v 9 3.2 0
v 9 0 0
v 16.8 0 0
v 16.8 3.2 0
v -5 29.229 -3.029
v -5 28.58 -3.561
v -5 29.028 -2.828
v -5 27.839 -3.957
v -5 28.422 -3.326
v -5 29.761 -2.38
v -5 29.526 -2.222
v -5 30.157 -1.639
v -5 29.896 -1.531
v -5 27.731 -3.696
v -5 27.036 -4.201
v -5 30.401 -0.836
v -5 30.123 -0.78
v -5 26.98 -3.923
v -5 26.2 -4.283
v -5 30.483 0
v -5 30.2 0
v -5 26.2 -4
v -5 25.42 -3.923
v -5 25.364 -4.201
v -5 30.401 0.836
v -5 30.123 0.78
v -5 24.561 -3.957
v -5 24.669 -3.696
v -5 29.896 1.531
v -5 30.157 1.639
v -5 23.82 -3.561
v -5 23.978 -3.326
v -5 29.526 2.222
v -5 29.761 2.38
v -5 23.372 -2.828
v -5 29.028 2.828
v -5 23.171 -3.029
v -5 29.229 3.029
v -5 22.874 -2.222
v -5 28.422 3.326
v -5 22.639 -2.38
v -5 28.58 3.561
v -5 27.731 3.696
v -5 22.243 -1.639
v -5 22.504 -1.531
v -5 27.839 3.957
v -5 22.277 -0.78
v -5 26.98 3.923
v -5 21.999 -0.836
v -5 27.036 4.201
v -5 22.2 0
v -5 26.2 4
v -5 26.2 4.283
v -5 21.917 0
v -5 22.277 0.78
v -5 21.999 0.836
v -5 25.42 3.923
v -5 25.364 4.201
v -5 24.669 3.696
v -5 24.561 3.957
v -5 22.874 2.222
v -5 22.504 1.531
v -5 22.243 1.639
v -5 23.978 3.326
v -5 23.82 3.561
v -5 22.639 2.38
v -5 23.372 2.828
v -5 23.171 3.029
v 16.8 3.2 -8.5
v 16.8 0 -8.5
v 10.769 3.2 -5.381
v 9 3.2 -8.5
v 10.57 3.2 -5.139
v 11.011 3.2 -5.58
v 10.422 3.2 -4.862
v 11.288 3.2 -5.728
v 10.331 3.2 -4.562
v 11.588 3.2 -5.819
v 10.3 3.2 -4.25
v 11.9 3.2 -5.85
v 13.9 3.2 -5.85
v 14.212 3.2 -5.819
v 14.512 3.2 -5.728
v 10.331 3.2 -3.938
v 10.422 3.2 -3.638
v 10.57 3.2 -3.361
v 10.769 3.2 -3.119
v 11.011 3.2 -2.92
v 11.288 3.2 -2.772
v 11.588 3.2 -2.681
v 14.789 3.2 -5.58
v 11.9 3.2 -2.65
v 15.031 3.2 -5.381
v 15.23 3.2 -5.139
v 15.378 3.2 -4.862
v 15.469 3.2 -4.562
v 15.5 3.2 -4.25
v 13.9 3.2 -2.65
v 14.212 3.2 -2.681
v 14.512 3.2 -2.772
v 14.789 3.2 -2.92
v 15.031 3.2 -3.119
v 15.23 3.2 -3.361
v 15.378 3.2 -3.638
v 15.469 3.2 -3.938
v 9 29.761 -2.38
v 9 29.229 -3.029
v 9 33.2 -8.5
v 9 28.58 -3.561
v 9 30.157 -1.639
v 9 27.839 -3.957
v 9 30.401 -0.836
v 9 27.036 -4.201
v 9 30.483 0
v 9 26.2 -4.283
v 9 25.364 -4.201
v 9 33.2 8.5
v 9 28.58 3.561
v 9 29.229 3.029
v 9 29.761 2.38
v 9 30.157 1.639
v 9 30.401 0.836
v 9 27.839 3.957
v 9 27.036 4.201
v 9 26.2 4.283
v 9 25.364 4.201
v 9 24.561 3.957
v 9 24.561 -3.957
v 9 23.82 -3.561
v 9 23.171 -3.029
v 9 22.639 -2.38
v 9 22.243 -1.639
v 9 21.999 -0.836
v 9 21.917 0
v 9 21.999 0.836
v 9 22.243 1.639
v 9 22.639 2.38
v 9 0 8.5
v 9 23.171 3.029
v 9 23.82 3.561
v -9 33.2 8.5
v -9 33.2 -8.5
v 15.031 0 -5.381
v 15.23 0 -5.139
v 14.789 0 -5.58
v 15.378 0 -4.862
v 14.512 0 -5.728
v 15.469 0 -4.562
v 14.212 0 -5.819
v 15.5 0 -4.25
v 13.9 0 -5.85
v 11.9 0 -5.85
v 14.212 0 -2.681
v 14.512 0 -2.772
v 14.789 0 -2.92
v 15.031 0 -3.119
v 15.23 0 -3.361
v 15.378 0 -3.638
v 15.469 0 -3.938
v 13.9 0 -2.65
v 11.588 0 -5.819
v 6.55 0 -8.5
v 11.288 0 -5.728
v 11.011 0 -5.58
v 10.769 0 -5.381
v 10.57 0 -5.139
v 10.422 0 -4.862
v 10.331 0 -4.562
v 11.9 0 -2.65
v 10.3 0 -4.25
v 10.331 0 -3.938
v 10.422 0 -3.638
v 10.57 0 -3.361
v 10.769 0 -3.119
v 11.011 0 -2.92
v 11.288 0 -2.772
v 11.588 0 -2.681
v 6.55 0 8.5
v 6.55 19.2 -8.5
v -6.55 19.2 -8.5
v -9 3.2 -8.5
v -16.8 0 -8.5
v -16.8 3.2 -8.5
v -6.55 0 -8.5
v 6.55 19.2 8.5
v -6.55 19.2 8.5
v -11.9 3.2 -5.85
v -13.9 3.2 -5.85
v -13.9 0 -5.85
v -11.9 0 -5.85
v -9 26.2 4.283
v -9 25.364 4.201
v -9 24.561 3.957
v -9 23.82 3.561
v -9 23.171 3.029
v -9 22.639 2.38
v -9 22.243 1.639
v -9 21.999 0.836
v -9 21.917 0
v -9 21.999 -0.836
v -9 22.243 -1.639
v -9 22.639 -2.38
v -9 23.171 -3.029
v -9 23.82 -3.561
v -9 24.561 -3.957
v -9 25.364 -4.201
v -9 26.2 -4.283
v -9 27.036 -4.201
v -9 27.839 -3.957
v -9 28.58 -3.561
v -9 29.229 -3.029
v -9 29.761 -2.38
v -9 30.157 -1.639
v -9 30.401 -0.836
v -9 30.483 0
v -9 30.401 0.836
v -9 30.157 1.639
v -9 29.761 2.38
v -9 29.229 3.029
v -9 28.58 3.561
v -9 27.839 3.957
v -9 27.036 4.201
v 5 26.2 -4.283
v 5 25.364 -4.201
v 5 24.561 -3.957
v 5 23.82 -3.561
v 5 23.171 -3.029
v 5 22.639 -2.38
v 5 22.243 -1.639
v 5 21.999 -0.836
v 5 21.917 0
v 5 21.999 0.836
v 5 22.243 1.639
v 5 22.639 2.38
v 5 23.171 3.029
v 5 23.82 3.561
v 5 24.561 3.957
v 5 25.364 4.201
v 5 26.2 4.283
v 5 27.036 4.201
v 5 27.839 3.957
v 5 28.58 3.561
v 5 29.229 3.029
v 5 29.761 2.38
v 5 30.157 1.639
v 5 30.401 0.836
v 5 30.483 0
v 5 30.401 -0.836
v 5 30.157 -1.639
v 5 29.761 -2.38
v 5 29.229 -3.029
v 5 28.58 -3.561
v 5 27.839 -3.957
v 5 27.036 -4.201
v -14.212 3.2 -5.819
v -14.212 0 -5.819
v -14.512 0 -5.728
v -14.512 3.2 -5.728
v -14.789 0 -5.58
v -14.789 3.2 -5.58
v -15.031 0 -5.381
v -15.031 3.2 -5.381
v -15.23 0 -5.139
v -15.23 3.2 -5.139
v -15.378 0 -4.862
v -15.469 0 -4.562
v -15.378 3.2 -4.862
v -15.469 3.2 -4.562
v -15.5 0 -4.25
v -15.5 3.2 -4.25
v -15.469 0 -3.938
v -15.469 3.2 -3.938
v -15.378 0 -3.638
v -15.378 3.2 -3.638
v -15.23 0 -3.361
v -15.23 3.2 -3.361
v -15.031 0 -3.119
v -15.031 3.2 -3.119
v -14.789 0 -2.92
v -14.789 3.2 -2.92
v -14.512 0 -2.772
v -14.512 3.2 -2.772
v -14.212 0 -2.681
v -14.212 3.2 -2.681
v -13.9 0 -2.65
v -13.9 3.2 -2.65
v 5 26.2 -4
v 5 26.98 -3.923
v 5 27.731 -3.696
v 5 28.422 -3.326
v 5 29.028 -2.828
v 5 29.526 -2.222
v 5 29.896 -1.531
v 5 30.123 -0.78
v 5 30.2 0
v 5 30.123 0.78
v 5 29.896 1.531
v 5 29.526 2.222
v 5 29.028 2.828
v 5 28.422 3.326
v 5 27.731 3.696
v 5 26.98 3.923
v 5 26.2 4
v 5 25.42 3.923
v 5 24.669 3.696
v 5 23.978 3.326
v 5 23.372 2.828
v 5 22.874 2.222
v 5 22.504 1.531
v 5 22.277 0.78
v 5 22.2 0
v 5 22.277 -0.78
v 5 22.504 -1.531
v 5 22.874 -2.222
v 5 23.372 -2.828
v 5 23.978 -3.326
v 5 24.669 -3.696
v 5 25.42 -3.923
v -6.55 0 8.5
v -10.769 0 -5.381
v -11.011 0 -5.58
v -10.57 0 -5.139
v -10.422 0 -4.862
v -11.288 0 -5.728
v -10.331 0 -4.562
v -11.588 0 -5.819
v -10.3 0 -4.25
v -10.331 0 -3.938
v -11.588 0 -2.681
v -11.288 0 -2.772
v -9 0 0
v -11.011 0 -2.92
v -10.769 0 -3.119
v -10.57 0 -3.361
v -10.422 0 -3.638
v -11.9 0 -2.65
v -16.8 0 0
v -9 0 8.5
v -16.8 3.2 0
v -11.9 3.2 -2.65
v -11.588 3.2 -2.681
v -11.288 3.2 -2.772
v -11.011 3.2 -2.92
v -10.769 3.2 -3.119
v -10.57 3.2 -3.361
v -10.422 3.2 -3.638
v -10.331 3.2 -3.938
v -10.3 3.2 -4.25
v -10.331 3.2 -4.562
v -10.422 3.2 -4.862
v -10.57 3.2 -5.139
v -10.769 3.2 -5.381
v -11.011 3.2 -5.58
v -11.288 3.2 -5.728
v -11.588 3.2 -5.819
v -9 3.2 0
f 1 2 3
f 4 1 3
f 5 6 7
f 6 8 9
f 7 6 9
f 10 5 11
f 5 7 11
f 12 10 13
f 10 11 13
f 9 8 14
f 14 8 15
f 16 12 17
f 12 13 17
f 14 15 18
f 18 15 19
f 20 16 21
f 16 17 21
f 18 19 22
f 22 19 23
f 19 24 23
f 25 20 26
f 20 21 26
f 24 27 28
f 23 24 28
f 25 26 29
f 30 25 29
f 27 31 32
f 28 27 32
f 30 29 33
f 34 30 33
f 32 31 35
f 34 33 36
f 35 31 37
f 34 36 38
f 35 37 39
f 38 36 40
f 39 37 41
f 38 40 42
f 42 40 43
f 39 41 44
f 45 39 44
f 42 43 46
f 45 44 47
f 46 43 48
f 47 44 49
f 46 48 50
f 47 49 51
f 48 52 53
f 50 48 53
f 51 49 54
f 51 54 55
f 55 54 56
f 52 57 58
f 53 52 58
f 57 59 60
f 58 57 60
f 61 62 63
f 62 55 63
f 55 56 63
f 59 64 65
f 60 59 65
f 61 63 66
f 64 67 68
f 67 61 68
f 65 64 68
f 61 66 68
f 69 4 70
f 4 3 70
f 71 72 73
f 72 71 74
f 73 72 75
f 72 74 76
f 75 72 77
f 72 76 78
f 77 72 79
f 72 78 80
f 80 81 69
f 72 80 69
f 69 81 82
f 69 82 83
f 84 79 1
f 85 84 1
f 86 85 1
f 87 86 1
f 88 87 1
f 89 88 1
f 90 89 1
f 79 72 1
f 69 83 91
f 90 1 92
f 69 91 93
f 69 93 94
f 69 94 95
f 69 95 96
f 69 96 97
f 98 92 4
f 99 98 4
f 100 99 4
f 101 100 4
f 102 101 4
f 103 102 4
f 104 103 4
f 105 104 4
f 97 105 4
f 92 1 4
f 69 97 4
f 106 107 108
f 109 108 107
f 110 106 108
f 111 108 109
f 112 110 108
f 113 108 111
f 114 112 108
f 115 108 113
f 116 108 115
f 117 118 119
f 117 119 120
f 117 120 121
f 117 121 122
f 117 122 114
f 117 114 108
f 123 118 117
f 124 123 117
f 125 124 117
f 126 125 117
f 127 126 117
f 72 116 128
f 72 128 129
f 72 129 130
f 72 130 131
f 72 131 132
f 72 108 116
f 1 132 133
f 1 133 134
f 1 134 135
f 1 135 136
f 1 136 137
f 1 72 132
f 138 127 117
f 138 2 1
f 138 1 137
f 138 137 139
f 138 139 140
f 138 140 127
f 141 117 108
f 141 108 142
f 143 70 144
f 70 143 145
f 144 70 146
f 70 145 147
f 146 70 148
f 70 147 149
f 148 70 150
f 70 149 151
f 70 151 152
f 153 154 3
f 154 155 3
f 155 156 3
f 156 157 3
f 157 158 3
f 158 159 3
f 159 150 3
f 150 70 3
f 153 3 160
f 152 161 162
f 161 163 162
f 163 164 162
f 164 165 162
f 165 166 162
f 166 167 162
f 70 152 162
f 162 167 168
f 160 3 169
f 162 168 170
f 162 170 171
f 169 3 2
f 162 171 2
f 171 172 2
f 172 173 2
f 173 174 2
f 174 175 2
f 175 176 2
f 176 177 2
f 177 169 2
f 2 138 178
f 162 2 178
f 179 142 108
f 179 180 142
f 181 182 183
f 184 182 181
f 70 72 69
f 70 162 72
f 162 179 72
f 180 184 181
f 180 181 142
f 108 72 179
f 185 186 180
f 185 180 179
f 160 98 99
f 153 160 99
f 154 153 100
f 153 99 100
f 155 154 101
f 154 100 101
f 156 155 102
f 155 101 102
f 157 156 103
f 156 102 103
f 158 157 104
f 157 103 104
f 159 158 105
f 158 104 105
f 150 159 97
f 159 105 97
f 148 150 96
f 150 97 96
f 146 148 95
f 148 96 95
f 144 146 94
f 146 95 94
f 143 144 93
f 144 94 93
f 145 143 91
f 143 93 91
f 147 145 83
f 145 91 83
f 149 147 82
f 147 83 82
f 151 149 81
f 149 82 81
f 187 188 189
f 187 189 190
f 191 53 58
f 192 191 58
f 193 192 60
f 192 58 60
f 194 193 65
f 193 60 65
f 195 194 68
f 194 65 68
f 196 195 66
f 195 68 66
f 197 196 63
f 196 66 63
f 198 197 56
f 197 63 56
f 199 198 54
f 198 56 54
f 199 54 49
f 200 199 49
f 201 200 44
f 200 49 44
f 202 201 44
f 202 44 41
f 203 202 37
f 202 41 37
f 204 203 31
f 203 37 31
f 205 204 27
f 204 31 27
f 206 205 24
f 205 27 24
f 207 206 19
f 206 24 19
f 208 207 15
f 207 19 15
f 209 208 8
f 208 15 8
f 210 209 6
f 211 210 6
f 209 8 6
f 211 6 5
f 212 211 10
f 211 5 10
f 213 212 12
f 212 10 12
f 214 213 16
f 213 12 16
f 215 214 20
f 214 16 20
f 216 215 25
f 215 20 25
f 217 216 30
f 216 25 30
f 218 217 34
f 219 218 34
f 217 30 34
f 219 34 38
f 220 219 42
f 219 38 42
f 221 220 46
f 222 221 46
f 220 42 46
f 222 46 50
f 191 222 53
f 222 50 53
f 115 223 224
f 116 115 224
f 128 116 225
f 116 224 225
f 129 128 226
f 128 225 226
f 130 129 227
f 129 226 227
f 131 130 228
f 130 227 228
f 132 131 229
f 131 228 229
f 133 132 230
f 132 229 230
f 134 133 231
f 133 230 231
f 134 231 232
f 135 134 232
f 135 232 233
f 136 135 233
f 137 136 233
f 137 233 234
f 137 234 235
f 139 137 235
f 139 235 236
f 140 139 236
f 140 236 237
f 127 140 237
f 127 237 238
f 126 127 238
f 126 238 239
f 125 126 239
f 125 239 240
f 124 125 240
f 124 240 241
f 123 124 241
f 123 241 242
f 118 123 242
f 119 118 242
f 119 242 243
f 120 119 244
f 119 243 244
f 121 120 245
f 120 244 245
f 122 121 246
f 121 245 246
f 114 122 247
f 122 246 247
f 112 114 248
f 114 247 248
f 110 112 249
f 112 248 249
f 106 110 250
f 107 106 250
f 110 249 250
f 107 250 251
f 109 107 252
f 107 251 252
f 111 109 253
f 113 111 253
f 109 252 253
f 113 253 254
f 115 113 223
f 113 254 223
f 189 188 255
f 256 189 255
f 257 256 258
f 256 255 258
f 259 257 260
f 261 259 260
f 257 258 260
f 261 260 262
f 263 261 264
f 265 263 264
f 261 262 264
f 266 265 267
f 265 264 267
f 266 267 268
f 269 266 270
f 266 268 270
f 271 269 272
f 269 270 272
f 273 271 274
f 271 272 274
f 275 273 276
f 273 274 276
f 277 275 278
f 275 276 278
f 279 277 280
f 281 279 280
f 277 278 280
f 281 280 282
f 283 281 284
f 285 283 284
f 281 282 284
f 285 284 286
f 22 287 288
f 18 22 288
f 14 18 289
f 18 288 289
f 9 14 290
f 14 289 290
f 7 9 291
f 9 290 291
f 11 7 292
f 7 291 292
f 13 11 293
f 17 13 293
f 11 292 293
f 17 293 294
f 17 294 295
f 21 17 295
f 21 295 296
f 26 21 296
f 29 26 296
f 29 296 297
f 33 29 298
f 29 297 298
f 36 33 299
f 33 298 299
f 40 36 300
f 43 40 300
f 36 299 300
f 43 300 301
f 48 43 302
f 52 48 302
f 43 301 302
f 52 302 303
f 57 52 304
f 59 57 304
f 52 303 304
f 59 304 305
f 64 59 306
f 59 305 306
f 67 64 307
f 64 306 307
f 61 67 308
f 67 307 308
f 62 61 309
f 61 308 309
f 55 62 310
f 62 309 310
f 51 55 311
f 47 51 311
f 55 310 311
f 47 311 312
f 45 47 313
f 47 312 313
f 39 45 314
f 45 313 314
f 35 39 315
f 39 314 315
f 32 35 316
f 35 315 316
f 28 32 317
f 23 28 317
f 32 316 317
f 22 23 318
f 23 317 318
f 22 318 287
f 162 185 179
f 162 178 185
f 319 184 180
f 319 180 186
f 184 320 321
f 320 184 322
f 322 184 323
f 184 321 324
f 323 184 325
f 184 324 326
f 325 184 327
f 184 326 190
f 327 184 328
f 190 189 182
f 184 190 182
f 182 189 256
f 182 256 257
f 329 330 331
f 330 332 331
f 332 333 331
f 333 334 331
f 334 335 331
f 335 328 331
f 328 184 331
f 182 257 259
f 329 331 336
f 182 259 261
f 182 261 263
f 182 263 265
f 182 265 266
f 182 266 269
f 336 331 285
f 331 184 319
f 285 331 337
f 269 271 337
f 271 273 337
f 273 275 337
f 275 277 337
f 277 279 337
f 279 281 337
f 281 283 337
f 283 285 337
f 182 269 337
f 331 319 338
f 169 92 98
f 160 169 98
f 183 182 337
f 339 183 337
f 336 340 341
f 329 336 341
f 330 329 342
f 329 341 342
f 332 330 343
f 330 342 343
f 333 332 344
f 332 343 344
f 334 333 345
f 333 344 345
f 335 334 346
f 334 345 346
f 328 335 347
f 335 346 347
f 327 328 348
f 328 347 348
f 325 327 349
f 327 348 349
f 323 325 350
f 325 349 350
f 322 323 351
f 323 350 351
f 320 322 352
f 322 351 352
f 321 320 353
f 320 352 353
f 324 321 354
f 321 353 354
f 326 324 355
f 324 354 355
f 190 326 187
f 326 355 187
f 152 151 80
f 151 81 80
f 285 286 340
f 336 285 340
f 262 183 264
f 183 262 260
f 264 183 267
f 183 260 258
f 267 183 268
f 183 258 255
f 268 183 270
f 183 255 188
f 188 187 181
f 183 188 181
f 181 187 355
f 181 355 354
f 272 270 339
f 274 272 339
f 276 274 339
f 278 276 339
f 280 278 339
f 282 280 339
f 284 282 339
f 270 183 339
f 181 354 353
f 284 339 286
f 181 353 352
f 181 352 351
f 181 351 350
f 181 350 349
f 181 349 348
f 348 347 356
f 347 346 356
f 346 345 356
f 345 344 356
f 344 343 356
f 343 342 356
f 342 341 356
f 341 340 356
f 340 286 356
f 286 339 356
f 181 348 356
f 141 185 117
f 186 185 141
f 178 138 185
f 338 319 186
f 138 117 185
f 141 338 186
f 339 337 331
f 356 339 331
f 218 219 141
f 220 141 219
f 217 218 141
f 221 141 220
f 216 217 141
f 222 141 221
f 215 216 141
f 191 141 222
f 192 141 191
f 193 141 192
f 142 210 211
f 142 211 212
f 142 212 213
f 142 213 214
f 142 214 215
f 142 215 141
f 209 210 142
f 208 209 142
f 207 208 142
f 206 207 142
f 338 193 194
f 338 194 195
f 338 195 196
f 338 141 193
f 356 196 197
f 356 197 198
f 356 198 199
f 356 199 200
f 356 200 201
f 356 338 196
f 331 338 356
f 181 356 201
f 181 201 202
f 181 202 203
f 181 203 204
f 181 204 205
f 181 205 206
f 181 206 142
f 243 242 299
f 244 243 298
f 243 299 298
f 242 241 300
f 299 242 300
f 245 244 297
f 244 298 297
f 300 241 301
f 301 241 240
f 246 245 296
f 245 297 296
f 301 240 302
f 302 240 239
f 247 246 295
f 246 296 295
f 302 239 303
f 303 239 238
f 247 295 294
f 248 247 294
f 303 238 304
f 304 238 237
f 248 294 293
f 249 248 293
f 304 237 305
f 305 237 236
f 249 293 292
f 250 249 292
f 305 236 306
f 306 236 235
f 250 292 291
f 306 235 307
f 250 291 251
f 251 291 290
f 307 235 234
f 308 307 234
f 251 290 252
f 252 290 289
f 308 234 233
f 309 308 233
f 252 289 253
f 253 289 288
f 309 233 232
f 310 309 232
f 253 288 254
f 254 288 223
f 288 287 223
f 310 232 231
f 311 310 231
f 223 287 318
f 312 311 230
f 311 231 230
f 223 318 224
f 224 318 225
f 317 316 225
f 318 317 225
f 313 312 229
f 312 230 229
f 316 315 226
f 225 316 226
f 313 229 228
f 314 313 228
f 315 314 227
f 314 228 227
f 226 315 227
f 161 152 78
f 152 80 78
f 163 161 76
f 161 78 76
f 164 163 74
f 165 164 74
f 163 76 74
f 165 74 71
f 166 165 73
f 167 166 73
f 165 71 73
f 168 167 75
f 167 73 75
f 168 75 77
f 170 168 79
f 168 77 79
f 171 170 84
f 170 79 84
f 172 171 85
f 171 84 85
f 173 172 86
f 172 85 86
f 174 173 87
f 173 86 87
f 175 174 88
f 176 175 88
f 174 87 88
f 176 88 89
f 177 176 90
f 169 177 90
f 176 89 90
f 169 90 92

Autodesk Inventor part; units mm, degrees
ref_plane "YZ Plane" through (0, 0, 0) normal (1, 0, 0) x (0, 1, 0)
ref_plane "XZ Plane" through (0, 0, 0) normal (0, 1, 0) x (-1, 0, 0)
ref_plane "XY Plane" through (0, 0, 0) normal (0, 0, 1) x (1, 0, 0)
sketch "Sketch1" plane through (0, 0, 0) normal (0, 1, 0) x (-1, 0, 0)
  line L0 (-9, 8.5) -> (9, 8.5)
  line L1 (9, 8.5) -> (9, -8.5)
  line L2 (9, -8.5) -> (-9, -8.5)
  line L3 (-9, -8.5) -> (-9, 8.5)
  line L4 (-9, 8.5) -> (9, -8.5) construction
  line L5 (9, 8.5) -> (-9, -8.5) construction
  point P0 (0, 0)
  dimension "d0" = 18
  dimension "d1" = 17
extrude "Extrusion1" add sketch "Sketch1" along normal blind 33.2
sketch "Sketch2" plane through (0, 0, 0) normal (0, -1, 0) x (1, 0, 0)
  line L0 (9, -8.5) -> (-9, -8.5) projected
  line L1 (-6.55, 8.5) -> (6.55, 8.5)
  line L2 (6.55, 8.5) -> (6.55, -8.5)
  line L3 (6.55, -8.5) -> (-6.55, -8.5)
  line L4 (-6.55, -8.5) -> (-6.55, 8.5)
  line L5 (-6.55, 8.5) -> (6.55, -8.5) construction
  line L6 (6.55, 8.5) -> (-6.55, -8.5) construction
  point P0 (0, 0)
  point P1 (-6.55, -8.5)
  dimension "d4" = 13.1
extrude "Extrusion2" cut sketch "Sketch2" against normal blind 19.2
sketch "Sketch4" plane through (0, 0, 0) normal (0, -1, 0) x (1, 0, 0)
  line L0 (9, 8.5) -> (9, -8.5) projected
  line L1 (9, 0) -> (16.8, 0)
  line L2 (16.8, 0) -> (16.8, -8.5)
  line L3 (16.8, -8.5) -> (9, -8.5)
  line L4 (9, -8.5) -> (9, 0)
  line L5 (-9, -8.5) -> (-9, 8.5) projected
  line L6 (-9, -8.5) -> (-16.8, -8.5)
  line L7 (-16.8, -8.5) -> (-16.8, 0)
  line L8 (-16.8, 0) -> (-9, 0)
  line L9 (-9, 0) -> (-9, -8.5)
  point P0 (0, 0)
  dimension "d7" = 7.8
  dimension "d8" = 7.8
extrude "Extrusion3" add sketch "Sketch4" against normal blind 3.2
sketch "Sketch5" plane through (0, 3.2, 0) normal (0, 1, 0) x (1, 0, 0)
  line L0 (9, 0) -> (9, 8.5) construction
  line L1 (9, 4.25) -> (11.9, 4.25) construction
  circle A0 centre (11.9, 4.25) radius 1.6
  line L2 (11.9, 4.25) -> (13.9, 4.25) construction
  circle A1 centre (13.9, 4.25) radius 1.6
  line L3 (13.9, 5.85) -> (11.9, 5.85)
  line L4 (11.9, 2.65) -> (13.9, 2.65)
  line L5 (-9, 8.5) -> (-9, 0) construction
  line L6 (-9, 4.25) -> (-11.9, 4.25) construction
  line L7 (-11.9, 4.25) -> (-13.9, 4.25) construction
  circle A2 centre (-11.9, 4.25) radius 1.6
  circle A3 centre (-13.9, 4.25) radius 1.6
  line L8 (-13.9, 5.85) -> (-11.9, 5.85)
  line L9 (-13.9, 2.65) -> (-11.9, 2.65)
  point P0 (0, 0)
  dimension "d11" = 2.9
  dimension "d12" = 3.2
  dimension "d13" = 2
  dimension "d14" = 3.2
  dimension "d17" = 2.9
  dimension "d18" = 2
  dimension "d19" = 3.2
  dimension "d20" = 3.2
extrude "Extrusion4" cut sketch "Sketch5" against normal through all
sketch "Sketch6" plane through (9, 0, 8.5) normal (1, 0, 0) x (0, 0, -1)
  line L0 (0, 33.2) -> (17, 33.2) construction
  line L1 (8.5, 33.2) -> (8.5, 26.2) construction
  circle A0 centre (8.5, 26.2) radius 4
  point P0 (8.5, 0)
  dimension "d21" = 7
  dimension "d22" = 8
extrude "Extrusion5" cut sketch "Sketch6" against normal through all
sketch "Sketch8" plane through (9, 0, 8.5) normal (1, 0, 0) x (0, 0, -1)
  line L0 (0, 33.2) -> (17, 33.2) construction
  line L1 (8.5, 33.2) -> (8.5, 26.2) construction
  point P0 (8.5, 0)
  dimension "d33" = 7
hole "Hole2" at (9, 26.2, 0) direction (-1, 0, 0) diameter 8.566 depth 4 thread size "G 1/8-28" standard "BSP Pipe Threads"
sketch "Sketch9" plane through (-9, 0, 8.5) normal (-1, 0, 0) x (0, 0, 1)
  line L0 (-17, 33.2) -> (0, 33.2) construction
  line L1 (-8.5, 33.2) -> (-8.5, 26.2) construction
  point P0 (-8.5, 0)
  dimension "d41" = 7
hole "Hole3" at (-9, 26.2, 0) direction (1, 0, 0) diameter 8.566 depth 4 thread size "G 1/8-28" standard "BSP Pipe Threads"
properties part number "ADAPTER_AOM-brimrose-watercooled-cover"
